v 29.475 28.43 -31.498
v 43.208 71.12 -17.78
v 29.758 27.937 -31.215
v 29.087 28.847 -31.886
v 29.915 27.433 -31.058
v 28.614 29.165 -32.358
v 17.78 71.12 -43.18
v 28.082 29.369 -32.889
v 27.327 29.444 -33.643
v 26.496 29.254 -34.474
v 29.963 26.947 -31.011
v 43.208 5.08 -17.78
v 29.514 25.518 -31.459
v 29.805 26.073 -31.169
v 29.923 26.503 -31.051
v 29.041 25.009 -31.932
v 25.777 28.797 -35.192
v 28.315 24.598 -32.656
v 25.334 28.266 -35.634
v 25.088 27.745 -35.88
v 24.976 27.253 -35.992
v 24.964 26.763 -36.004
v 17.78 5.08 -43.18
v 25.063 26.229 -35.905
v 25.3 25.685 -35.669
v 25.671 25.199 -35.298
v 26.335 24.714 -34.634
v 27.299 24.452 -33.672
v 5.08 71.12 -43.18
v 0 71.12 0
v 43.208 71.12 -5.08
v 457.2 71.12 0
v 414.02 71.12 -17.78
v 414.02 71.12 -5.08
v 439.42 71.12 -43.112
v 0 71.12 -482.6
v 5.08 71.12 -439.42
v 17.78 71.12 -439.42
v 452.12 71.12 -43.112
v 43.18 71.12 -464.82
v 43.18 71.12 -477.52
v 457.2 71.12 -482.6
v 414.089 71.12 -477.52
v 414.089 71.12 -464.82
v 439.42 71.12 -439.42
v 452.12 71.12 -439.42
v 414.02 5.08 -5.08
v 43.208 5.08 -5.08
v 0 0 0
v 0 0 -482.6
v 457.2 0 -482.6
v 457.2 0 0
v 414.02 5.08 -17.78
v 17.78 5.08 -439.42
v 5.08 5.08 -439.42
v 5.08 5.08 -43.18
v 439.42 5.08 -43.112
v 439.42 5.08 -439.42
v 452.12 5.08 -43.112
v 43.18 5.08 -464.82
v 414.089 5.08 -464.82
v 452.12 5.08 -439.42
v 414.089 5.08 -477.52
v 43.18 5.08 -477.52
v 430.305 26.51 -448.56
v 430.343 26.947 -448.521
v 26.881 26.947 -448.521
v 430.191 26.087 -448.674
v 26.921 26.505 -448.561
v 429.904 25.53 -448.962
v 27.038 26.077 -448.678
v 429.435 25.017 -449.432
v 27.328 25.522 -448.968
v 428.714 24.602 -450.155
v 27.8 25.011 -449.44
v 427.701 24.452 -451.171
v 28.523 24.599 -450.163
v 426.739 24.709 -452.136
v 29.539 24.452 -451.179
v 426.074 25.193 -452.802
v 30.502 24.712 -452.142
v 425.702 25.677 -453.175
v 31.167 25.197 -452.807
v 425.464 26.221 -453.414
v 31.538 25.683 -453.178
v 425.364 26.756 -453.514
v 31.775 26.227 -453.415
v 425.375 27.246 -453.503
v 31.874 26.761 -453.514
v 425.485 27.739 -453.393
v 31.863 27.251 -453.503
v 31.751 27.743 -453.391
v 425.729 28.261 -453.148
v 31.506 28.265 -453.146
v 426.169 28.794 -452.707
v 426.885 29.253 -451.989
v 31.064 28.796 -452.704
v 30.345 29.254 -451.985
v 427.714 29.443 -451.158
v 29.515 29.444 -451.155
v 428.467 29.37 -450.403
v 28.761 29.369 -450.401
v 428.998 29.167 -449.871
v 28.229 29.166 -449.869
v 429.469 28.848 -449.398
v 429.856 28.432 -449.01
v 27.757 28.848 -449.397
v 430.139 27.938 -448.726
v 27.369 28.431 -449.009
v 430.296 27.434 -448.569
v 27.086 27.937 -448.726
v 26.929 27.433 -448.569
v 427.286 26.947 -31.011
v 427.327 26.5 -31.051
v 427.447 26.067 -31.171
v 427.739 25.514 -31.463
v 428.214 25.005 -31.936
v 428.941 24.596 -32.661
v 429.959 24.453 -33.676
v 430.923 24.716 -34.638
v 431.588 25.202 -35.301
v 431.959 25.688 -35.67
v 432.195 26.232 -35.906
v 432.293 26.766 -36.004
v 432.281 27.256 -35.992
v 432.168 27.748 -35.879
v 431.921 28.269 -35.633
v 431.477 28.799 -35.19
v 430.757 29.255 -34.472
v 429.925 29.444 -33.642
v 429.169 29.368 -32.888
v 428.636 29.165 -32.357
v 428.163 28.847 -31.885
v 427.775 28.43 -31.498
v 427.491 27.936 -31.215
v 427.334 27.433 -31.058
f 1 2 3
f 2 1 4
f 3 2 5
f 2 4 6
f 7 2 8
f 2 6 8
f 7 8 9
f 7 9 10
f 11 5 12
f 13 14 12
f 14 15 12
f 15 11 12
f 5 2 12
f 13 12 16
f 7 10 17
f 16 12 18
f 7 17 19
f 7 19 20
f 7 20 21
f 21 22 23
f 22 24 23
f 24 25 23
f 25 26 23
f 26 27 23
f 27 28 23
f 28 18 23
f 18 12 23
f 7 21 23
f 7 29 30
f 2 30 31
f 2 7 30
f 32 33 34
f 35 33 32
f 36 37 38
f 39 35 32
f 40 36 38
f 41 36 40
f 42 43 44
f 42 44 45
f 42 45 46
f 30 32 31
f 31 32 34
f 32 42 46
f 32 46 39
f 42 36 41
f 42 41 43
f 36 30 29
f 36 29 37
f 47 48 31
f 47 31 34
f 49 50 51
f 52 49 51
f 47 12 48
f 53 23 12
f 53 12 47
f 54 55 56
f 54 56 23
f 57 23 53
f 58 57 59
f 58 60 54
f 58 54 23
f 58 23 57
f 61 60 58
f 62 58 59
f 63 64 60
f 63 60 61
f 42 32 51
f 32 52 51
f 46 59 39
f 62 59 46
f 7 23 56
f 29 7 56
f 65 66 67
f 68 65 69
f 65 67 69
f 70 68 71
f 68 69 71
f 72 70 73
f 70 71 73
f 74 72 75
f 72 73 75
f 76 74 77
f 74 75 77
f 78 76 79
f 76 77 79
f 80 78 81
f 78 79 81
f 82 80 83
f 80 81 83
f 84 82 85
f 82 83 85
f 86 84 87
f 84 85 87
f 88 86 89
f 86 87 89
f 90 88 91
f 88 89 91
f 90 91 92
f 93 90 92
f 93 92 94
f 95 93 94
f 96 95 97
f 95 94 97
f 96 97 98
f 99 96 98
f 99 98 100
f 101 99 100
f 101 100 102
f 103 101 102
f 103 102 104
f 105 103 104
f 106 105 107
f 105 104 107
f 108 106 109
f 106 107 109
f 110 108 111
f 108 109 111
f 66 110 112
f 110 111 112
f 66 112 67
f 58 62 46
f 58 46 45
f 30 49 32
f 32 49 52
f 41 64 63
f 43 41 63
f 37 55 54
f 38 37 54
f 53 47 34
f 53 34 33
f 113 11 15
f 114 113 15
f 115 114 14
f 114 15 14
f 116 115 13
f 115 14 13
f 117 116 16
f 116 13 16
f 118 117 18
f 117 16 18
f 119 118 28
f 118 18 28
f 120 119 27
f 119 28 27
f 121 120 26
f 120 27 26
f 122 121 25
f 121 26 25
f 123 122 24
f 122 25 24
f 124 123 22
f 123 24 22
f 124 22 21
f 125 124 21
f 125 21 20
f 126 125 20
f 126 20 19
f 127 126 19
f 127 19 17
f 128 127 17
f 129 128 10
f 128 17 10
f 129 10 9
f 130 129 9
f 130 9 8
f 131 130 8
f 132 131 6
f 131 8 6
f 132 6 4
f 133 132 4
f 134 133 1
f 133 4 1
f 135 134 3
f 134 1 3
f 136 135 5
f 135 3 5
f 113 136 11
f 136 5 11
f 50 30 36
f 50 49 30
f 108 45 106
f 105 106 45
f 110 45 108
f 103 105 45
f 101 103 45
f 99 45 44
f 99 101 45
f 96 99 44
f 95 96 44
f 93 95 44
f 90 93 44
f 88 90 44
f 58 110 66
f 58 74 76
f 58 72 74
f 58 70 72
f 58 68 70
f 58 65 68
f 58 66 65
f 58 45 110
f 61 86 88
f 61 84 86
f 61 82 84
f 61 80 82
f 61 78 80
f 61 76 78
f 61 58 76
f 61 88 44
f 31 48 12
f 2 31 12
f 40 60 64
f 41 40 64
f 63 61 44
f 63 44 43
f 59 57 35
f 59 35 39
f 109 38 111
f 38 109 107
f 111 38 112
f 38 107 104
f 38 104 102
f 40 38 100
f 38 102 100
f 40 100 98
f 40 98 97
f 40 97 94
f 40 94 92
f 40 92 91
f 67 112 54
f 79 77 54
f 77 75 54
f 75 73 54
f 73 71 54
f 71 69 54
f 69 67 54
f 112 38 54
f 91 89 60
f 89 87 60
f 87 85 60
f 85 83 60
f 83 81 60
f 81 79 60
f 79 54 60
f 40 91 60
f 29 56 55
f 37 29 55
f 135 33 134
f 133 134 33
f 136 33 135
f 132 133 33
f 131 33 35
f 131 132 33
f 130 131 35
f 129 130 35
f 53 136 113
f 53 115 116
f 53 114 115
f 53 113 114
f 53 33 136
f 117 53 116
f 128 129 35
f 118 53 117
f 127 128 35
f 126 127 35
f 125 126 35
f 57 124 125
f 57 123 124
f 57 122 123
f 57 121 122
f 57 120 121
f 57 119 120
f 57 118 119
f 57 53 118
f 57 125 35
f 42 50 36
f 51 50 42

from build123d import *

# Parameters (mm, degrees)
SKETCH3_W            = 457.2
SKETCH3_H            = 482.6
BOSS_EXTRUDE2_DEPTH  = 5.08
SKETCH4_W            = 457.2
SKETCH4_H            = 482.6
SKETCH4_W_2          = 447.04
SKETCH4_H_2          = 472.44
BOSS_EXTRUDE3_DEPTH  = 66.04
BOSS_EXTRUDE4_DEPTH  = 66.04
BOSS_EXTRUDE5_DEPTH  = 66.04
BOSS_EXTRUDE6_DEPTH  = 66.04
BOSS_EXTRUDE7_DEPTH  = 66.04
SKETCH13_R           = 2.5
BOSS_EXTRUDE11_DEPTH = 447.04


with BuildPart() as part:
    # Sketch3 → Boss-Extrude2 (new body)
    with BuildSketch(Plane(origin=(0, 0, 0), x_dir=(1, 0, 0), z_dir=(0, 1, 0))):
        with Locations((228.6, 241.3)):
            Rectangle(SKETCH3_W, SKETCH3_H)
    extrude(amount=BOSS_EXTRUDE2_DEPTH)

    # Sketch4 → Boss-Extrude3 (add)
    with BuildSketch(Plane(origin=(0, 5.08, 0), x_dir=(1, 0, 0), z_dir=(0, 1, 0))):
        with Locations((228.6, 241.3)):
            Rectangle(SKETCH4_W, SKETCH4_H)
        with Locations((228.6, 241.3)):
            Rectangle(SKETCH4_W_2, SKETCH4_H_2, mode=Mode.SUBTRACT)
    extrude(amount=BOSS_EXTRUDE3_DEPTH)

    # Sketch5 → Boss-Extrude4 (add)
    with BuildSketch(Plane(origin=(0, 5.08, 0), x_dir=(1, 0, 0), z_dir=(0, 1, 0))):
        Polygon((5.08, 5.08), (43.208241799, 5.08), (43.208241799, 17.78), (17.78, 43.18), (5.08, 43.18), align=None)
    extrude(amount=BOSS_EXTRUDE4_DEPTH)

    # Sketch6 → Boss-Extrude5 (add)
    with BuildSketch(Plane(origin=(0, 5.08, 0), x_dir=(1, 0, 0), z_dir=(0, 1, 0))):
        Polygon((452.12, 5.08), (414.02, 5.08), (414.02, 17.78), (439.42, 43.111754401), (452.12, 43.111754401), align=None)
    extrude(amount=BOSS_EXTRUDE5_DEPTH)

    # Sketch7 → Boss-Extrude6 (add)
    with BuildSketch(Plane(origin=(0, 5.08, 0), x_dir=(1, 0, 0), z_dir=(0, 1, 0))):
        Polygon((452.12, 477.52), (452.12, 439.42), (439.42, 439.42), (414.088783751, 464.82), (414.088783751, 477.52), align=None)
    extrude(amount=BOSS_EXTRUDE6_DEPTH)

    # Sketch8 → Boss-Extrude7 (add)
    with BuildSketch(Plane(origin=(0, 5.08, 0), x_dir=(1, 0, 0), z_dir=(0, 1, 0))):
        Polygon((5.08, 477.52), (5.08, 439.42), (17.78, 439.42), (43.18, 464.82), (43.18, 477.52), align=None)
    extrude(amount=BOSS_EXTRUDE7_DEPTH)

    # Sketch13 → Boss-Extrude11 (add)
    with BuildSketch(Plane(origin=(5.08, 0, 0), x_dir=(0, 0, -1), z_dir=(1, 0, 0))):
        with Locations(Location((33.510747134, 26.94718976, 0), (0, 0, 180))):
            Circle(SKETCH13_R)
        with Locations(Location((451.021338275, 26.94718976, 0), (0, 0, 180))):
            Circle(SKETCH13_R)
    extrude(amount=BOSS_EXTRUDE11_DEPTH)


solid = part.part
